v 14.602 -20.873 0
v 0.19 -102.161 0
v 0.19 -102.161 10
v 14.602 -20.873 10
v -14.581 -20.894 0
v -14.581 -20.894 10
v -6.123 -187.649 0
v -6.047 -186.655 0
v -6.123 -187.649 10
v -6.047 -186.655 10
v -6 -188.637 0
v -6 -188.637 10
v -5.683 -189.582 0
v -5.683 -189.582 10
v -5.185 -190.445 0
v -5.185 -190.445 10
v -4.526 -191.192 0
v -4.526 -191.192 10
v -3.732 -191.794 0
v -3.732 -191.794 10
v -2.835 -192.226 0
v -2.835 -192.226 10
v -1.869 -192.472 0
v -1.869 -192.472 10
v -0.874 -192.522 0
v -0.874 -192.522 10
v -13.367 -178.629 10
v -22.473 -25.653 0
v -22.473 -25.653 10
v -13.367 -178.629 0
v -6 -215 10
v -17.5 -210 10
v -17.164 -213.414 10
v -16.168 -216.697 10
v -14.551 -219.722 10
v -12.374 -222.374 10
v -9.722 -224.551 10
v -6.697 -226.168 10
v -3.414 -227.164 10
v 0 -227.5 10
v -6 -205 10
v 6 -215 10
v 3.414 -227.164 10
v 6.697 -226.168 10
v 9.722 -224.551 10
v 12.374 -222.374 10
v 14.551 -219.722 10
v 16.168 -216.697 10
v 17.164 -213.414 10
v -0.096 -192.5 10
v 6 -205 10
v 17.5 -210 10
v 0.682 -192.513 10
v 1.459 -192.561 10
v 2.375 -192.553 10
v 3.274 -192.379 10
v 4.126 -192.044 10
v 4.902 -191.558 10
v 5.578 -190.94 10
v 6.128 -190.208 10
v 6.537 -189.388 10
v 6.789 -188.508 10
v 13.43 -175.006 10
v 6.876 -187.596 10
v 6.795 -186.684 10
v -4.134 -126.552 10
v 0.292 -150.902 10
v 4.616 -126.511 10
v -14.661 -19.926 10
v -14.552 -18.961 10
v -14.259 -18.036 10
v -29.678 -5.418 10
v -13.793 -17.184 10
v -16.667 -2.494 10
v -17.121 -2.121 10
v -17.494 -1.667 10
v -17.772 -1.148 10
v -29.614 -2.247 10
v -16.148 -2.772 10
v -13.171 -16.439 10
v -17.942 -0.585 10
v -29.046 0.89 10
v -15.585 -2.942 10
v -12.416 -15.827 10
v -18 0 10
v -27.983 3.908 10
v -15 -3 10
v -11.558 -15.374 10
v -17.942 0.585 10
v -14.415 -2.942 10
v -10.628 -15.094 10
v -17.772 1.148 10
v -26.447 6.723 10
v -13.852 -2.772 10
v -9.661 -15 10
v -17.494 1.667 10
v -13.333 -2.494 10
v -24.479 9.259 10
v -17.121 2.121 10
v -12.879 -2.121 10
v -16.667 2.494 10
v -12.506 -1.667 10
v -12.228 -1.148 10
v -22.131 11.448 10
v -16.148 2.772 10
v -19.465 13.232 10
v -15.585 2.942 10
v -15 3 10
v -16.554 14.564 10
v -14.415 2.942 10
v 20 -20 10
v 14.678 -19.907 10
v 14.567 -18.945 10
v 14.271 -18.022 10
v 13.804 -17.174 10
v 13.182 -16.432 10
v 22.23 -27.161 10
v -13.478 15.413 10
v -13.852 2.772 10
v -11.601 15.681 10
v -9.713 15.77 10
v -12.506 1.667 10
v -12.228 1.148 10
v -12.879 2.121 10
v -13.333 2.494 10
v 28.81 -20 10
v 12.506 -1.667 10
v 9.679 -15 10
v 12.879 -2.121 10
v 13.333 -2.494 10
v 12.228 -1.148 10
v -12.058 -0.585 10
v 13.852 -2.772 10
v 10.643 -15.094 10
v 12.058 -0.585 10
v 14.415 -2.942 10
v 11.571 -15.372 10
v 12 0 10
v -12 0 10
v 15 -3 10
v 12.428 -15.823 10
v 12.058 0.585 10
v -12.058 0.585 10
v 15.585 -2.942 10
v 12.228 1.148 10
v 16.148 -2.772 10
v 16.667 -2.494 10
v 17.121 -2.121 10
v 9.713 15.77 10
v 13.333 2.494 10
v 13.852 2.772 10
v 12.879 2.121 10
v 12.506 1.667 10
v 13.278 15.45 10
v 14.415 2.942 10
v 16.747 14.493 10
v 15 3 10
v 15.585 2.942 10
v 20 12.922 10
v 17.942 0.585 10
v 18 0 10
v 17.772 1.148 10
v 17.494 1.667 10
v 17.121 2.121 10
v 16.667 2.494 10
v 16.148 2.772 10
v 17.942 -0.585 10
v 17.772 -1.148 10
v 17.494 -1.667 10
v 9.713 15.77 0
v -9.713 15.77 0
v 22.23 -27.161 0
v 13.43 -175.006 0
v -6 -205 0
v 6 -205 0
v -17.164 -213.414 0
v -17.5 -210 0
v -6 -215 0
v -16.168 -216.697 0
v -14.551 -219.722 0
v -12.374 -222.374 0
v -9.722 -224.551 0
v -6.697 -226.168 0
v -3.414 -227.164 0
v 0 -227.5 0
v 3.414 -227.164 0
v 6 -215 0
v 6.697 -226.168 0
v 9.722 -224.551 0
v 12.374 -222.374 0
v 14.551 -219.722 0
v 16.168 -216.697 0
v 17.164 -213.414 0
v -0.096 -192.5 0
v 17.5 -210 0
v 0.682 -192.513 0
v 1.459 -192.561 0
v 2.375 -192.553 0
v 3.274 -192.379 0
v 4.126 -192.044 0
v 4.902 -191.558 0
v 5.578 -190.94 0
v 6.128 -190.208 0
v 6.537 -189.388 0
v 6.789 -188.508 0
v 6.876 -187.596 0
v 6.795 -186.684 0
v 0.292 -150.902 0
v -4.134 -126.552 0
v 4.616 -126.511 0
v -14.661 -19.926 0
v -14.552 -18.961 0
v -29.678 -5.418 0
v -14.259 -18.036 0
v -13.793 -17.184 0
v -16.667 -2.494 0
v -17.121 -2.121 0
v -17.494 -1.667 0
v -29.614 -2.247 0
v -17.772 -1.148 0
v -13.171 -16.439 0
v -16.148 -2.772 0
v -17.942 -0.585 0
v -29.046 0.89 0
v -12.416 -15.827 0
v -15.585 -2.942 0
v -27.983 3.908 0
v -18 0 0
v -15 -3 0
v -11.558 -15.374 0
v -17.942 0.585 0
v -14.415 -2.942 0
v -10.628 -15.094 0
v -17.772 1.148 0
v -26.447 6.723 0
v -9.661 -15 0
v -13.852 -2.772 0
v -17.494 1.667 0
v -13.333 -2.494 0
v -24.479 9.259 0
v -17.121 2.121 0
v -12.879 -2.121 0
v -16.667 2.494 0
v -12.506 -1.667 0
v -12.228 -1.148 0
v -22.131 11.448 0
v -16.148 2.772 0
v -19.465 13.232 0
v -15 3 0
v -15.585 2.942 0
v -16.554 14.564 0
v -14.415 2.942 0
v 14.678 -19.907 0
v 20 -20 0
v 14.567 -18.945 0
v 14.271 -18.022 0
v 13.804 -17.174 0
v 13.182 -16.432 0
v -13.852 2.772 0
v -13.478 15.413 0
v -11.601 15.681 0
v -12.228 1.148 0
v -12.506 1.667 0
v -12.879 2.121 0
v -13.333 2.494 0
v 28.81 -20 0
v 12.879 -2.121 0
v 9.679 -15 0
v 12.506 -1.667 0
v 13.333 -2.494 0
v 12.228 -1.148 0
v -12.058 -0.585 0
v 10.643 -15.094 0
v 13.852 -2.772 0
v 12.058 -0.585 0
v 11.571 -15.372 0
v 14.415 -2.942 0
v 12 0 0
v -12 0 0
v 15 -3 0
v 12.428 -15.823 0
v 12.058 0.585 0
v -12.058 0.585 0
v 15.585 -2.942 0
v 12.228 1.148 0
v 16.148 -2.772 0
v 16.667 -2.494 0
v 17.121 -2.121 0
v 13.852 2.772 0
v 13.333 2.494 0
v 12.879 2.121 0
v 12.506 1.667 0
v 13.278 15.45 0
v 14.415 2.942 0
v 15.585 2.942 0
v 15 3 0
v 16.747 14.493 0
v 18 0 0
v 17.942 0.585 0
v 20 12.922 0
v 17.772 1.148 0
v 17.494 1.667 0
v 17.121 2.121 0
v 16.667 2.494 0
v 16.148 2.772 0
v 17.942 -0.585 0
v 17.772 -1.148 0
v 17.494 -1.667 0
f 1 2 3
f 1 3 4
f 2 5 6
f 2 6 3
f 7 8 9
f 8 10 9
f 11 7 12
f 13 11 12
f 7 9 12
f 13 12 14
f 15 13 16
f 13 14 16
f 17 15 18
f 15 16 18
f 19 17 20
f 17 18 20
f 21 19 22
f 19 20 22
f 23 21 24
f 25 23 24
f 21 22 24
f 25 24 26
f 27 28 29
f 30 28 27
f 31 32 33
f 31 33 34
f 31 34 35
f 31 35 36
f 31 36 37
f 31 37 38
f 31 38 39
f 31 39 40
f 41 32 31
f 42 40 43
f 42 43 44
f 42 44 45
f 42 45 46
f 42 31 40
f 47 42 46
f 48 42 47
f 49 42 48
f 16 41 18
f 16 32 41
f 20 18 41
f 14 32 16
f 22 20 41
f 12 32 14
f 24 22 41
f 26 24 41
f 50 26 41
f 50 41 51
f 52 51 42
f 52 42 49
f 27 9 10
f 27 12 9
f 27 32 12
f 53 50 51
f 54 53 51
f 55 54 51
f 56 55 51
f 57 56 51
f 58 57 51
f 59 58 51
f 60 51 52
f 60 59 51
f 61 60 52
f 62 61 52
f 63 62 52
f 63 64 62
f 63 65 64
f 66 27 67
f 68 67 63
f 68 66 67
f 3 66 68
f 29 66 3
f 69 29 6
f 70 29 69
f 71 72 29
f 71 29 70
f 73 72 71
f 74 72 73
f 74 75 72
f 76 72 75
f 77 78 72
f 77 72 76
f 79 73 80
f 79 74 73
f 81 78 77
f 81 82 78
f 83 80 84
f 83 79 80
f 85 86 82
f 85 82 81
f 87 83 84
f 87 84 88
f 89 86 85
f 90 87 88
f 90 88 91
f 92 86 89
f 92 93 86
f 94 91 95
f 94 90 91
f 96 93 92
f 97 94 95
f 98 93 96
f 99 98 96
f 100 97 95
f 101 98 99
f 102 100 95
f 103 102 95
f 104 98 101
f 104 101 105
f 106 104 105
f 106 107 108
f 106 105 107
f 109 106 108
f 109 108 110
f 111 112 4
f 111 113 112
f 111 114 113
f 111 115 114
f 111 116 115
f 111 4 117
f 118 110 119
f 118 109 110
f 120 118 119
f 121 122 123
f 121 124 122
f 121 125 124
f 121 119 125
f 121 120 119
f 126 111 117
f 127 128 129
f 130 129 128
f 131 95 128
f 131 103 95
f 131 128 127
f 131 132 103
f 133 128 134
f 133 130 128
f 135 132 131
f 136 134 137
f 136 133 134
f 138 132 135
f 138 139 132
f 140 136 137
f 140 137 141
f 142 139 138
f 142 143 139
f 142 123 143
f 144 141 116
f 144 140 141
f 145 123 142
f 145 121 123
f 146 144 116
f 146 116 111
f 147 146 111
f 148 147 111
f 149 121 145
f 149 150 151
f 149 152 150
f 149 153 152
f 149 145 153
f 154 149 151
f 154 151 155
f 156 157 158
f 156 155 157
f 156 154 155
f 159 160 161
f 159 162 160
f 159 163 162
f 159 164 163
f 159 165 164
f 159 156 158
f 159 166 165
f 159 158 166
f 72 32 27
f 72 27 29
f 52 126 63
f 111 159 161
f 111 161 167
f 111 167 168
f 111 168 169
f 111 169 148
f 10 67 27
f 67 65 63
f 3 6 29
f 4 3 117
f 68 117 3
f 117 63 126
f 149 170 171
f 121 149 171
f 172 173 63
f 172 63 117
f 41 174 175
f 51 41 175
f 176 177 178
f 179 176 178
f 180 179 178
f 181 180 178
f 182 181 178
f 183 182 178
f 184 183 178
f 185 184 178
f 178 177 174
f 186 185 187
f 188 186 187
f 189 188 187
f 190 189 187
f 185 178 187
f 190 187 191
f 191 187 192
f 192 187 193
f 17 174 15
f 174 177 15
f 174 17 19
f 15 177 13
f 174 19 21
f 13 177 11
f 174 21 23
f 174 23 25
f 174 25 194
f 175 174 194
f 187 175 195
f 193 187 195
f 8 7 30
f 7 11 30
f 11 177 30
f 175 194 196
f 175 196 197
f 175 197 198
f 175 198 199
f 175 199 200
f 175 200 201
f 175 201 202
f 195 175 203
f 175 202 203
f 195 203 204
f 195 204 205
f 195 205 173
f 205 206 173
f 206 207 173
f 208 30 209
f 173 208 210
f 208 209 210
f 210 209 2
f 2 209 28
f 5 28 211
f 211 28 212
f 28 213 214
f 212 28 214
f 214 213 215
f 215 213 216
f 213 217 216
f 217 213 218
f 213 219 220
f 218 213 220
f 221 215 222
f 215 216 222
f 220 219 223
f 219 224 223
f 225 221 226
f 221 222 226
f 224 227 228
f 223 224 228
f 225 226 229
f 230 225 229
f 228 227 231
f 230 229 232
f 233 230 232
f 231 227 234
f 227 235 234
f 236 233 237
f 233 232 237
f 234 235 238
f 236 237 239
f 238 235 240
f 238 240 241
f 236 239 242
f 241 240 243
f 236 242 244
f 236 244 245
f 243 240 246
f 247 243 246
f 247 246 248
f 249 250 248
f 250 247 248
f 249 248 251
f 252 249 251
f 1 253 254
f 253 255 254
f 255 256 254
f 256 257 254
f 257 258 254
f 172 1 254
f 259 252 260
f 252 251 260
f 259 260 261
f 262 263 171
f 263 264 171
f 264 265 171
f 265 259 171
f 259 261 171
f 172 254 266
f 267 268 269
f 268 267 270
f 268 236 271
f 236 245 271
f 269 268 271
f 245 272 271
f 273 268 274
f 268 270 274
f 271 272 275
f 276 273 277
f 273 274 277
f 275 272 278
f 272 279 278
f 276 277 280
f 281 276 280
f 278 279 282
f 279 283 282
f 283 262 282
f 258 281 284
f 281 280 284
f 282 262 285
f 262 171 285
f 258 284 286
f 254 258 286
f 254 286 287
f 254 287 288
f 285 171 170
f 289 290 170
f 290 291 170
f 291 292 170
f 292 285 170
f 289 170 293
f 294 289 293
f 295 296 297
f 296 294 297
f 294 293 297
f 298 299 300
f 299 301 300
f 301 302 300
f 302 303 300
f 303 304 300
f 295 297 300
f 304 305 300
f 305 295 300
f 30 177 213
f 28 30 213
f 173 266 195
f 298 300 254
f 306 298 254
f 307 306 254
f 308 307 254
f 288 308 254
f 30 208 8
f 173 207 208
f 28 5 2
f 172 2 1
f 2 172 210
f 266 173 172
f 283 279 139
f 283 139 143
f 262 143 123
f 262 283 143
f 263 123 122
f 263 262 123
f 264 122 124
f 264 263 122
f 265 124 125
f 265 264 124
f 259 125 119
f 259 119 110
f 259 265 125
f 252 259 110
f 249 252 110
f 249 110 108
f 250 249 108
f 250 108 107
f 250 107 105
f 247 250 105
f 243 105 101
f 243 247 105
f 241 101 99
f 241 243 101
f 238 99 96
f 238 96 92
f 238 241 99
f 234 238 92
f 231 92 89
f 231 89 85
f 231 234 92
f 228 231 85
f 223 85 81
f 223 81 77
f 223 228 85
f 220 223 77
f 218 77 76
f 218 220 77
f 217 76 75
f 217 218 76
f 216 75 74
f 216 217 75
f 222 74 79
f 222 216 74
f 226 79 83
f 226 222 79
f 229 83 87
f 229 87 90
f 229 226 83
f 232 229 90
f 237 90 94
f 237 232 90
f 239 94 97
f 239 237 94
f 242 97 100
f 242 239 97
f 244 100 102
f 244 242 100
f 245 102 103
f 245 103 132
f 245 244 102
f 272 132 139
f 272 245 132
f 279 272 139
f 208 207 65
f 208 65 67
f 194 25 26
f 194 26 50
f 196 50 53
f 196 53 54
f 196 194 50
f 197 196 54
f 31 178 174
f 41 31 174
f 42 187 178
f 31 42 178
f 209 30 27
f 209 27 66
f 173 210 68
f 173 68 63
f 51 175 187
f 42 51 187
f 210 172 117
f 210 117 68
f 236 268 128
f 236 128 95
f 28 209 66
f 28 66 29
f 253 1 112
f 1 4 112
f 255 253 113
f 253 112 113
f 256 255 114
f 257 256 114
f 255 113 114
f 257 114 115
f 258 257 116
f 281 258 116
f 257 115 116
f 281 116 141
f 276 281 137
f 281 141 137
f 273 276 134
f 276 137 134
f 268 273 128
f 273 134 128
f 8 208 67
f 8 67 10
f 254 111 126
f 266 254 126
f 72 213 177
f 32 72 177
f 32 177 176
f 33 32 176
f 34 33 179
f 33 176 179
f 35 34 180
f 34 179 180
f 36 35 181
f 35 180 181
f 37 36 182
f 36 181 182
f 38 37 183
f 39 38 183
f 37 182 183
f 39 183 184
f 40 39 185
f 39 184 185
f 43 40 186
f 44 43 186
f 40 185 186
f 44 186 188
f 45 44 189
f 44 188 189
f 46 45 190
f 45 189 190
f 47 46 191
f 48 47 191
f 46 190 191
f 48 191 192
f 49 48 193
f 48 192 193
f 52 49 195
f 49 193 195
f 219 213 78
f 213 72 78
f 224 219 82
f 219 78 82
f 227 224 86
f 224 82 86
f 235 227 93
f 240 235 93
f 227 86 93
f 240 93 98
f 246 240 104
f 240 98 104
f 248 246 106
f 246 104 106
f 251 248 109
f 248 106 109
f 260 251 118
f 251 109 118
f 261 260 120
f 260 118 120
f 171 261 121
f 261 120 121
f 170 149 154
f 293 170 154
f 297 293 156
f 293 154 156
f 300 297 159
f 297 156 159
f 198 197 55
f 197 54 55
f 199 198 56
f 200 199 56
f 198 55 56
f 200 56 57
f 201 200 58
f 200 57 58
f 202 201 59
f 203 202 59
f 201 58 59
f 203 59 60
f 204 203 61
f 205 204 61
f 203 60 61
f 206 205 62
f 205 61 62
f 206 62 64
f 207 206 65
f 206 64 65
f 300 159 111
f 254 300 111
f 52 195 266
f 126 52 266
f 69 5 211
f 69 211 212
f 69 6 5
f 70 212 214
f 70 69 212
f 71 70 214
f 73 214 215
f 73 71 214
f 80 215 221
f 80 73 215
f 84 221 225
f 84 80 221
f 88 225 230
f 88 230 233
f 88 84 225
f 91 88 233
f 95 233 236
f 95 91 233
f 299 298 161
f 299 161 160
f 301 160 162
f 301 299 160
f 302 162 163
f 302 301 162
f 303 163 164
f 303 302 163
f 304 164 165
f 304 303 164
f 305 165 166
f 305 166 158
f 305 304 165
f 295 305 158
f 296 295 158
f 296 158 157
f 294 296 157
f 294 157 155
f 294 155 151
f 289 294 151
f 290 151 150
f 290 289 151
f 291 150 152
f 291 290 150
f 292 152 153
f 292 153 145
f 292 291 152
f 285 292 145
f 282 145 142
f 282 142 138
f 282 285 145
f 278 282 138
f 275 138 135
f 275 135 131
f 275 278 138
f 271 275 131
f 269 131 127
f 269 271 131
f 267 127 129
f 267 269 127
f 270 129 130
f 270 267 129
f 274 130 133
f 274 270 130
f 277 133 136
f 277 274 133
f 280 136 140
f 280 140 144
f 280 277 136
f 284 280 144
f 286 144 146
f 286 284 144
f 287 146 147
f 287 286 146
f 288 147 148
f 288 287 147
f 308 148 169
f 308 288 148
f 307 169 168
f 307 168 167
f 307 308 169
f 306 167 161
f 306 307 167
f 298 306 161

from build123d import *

# Parameters (mm, degrees)
SKETCH1_R           = 3
BOSS_EXTRUDE2_DEPTH = 10
FILLET1_R           = 20
FILLET2_R           = 20
CUT_EXTRUDE1_START  = -10
CUT_EXTRUDE1_DEPTH  = 10
FILLET3_R           = 5
CUT_EXTRUDE6_DEPTH  = 10


with BuildPart() as part:
    # Sketch1 → Boss-Extrude2 (new body)
    with BuildSketch(Plane.XY):
        with BuildLine():
            Line((-30, 15.770412854), (-30, 0))
            Line((-30, 0), (-17.5, -210))
            ThreePointArc((-17.5, -210), (0, -227.5), (17.5, -210))
            Line((17.5, -210), (30, 0))
            Line((30, 0), (30, 15.770412854))
            Line((30, 15.770412854), (-30, 15.770412854))
        make_face()
        with Locations((-15, 0)):
            Circle(SKETCH1_R, mode=Mode.SUBTRACT)
        with Locations((15, 0)):
            Circle(SKETCH1_R, mode=Mode.SUBTRACT)
        Polygon((0, -205), (6, -205), (6, -215), (-6, -215), (-6, -205), align=None, mode=Mode.SUBTRACT)
    extrude(amount=BOSS_EXTRUDE2_DEPTH)

    # Fillet1
    fillet1_edges = [part.edges().sort_by_distance(p)[0] for p in [
        (-30, 15.770412854, 5),
    ]]
    fillet(fillet1_edges, radius=FILLET1_R)

    # Fillet2
    fillet2_edges = [part.edges().sort_by_distance(p)[0] for p in [
        (30, 15.770412854, 5),
    ]]
    fillet(fillet2_edges, radius=FILLET2_R)

    # Sketch4 → Cut-Extrude1 (cut)
    with BuildSketch(Plane.XY.offset(10).offset(CUT_EXTRUDE1_START)):
        Polygon((-15.651797422, -15), (0.190220551, -102.160979768), (15.643622882, -15), (15, -15), align=None)
        Polygon((-22.473027071, -25.6531452), (-13.367328465, -178.628881795), (-4.134156204, -126.551525408), align=None)
        Polygon((22.230419841, -27.161313899), (4.615986353, -126.511039477), (13.430162671, -175.005634359), align=None)
        with BuildLine():
            Line((0.291609598, -150.901585116), (-7.372445375, -194.128735111))
            ThreePointArc((-7.372445375, -194.128735111), (0.476576628, -192.506490497), (8.225632191, -194.553674383))
            Line((8.225632191, -194.553674383), (0.291609598, -150.901585116))
        make_face()
    extrude(amount=CUT_EXTRUDE1_DEPTH, mode=Mode.SUBTRACT)

    # Fillet3
    fillet3_edges = [part.edges().sort_by_distance(p)[0] for p in [
        (8.225632191, -194.553674383, 5),
        (-7.372445375, -194.128735111, 5),
        (-15.651797422, -15, 5),
        (15.643622882, -15, 5),
    ]]
    fillet(fillet3_edges, radius=FILLET3_R)

    # Sketch5 → Cut-Extrude6 (cut)
    with BuildSketch(Plane.XY.offset(10)):
        with BuildLine():
            Line((29.260488635, 0), (20, 0))
            Line((20, 0), (20, -20))
            Line((20, -20), (28.80952381, -20))
            Line((28.80952381, -20), (29.677502384, -5.417959945))
            ThreePointArc((29.677502384, -5.417959945), (29.653859351, -2.694751229), (29.260488635, 0))
        make_face()
        with BuildLine():
            Line((20, 12.921923742), (20, 0))
            Line((20, 0), (29.260488635, 0))
            ThreePointArc((29.260488635, 0), (25.96931496, 7.420606017), (20, 12.921923742))
        make_face()
    extrude(amount=-CUT_EXTRUDE6_DEPTH, mode=Mode.SUBTRACT)


solid = part.part
